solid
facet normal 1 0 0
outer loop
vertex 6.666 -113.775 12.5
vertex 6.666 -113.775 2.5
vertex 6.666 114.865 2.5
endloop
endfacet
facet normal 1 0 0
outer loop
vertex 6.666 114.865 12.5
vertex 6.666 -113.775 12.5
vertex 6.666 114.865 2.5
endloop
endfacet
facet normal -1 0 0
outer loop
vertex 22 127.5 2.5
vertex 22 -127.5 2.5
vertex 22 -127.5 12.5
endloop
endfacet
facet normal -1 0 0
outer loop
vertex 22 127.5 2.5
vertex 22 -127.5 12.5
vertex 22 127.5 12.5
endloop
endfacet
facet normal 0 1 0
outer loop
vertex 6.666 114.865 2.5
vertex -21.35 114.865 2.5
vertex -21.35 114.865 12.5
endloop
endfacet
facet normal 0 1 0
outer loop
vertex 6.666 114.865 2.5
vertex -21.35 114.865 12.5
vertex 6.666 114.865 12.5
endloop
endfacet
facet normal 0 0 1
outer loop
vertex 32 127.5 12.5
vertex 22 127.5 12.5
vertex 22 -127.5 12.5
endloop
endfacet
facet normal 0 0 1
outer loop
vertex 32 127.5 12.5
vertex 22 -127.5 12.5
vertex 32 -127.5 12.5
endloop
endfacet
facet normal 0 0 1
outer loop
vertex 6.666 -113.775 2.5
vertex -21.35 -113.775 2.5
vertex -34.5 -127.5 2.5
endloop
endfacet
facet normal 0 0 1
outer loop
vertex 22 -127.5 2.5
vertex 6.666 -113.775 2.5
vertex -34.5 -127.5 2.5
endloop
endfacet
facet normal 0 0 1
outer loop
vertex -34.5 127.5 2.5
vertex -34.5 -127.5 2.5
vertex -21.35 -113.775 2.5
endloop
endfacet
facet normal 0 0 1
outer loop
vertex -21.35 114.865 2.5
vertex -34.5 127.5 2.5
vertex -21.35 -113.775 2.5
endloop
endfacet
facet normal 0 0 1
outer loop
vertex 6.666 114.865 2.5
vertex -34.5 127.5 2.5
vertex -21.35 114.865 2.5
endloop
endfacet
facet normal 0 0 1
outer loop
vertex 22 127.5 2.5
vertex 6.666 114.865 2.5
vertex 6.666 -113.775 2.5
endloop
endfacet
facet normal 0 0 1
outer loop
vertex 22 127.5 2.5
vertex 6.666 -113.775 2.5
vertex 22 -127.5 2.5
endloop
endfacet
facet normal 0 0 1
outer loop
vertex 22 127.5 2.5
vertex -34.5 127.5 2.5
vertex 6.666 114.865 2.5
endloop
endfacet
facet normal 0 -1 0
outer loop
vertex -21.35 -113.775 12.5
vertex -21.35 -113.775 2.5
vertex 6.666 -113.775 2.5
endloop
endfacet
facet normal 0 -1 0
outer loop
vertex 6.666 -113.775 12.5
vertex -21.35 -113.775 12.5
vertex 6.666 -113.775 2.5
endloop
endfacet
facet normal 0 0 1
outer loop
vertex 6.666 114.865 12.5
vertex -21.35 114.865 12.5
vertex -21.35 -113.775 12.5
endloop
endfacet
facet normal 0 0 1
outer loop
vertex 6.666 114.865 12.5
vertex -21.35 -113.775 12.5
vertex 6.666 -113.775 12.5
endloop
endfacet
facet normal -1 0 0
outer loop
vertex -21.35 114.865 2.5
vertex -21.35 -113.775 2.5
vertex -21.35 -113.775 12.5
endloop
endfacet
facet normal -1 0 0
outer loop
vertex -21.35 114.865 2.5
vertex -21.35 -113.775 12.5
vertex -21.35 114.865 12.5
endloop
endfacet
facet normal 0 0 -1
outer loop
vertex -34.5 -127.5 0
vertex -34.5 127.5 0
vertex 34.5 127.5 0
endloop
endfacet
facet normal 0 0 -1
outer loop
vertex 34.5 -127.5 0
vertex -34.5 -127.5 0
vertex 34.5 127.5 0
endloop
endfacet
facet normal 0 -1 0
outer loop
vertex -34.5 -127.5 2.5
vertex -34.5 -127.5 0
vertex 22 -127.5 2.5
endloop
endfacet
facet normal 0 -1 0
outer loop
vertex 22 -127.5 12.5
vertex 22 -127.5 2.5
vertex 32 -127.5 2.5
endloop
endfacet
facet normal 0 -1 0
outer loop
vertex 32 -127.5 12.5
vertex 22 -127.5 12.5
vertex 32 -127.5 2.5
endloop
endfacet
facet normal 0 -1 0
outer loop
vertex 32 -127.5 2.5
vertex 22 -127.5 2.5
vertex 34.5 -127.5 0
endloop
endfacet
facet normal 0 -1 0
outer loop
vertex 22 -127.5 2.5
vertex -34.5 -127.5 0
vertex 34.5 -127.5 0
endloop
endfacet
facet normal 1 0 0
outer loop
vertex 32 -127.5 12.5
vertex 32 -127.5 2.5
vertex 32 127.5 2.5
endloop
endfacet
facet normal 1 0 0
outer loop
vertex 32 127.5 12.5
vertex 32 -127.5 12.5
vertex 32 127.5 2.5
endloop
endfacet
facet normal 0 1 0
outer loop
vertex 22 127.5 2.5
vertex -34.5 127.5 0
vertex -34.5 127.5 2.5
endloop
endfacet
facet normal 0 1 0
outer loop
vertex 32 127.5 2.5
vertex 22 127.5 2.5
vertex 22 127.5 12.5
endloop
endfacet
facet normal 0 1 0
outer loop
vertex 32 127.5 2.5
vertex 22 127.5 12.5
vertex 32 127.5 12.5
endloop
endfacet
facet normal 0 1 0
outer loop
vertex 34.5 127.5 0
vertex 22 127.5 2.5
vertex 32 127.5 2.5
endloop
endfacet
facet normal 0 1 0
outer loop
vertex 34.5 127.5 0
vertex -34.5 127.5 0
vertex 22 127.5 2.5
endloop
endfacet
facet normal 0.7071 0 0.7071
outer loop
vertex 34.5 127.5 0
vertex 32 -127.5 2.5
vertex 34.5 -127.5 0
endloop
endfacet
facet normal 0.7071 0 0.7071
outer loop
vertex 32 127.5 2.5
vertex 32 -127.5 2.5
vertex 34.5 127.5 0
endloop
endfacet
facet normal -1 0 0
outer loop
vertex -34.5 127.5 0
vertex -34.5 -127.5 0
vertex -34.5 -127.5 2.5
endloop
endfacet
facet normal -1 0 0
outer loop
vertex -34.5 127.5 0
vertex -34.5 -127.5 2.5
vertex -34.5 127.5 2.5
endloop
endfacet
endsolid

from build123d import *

# Parameters (mm, degrees)
F0_W     = 69
F0_H     = 255
F1_DEPTH = 2.5
F2_SIZE  = 2.49999
F3_W     = 10
F3_H     = 255
F4_DEPTH = 10
F5_W     = 28.0150985345
F5_H     = 228.639356792
F6_DEPTH = 10


# Not quite as in the source:
# - a fillet or chamfer is up to 0.001 mm smaller than in the source, because OpenCascade refuses the exact size


with BuildPart() as f1:
    # F0 (on Top) → F1 (new body)
    with BuildSketch(Plane.XY):
        Rectangle(F0_W, F0_H)
    extrude(amount=F1_DEPTH)

    # F2 (size 2.5 in the source; OpenCascade refuses exactly that, so slightly less here)
    f2_edges = [f1.edges().sort_by_distance(p)[0] for p in [
        (34.5, 0, 2.5),
    ]]
    chamfer(f2_edges, length=F2_SIZE)

    # F3 (on face) → F4 (join)
    with BuildSketch(Plane.XY.offset(2.5)):
        with Locations((27, 0)):
            Rectangle(F3_W, F3_H)
    extrude(amount=F4_DEPTH)

    # F5 (on face) → F6 (join)
    with BuildSketch(Plane.XY.offset(2.5)):
        with Locations((-7.3420391418, 0.5451031029)):
            Rectangle(F5_W, F5_H)
    extrude(amount=F6_DEPTH)


solid = f1.part
